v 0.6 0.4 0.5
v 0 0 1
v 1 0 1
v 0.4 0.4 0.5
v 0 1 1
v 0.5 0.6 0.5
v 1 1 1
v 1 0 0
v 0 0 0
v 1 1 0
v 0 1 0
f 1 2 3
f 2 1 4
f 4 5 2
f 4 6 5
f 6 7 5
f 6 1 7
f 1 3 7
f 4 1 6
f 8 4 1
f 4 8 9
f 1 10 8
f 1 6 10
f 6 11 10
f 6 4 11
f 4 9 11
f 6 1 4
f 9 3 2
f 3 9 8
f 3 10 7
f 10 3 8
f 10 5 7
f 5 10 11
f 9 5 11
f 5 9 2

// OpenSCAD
polyhedron(
  points=[
    [0, 0, 0],
    [1, 0, 0],
    [0, 1, 0],
    [1, 1, 0],

    [0, 0, 1],
    [1, 0, 1],
    [0, 1, 1],
    [1, 1, 1],

    [0.4, 0.4, 0.5],
    [0.6, 0.4, 0.5],
    [0.5, 0.6, 0.5],
  ],
  faces=[
    [5,4,8,9],
    [4,6,8],
    [6,10,8],
    [6,7,10],
    [7,9,10],
    [7,5,9],
    [10,9,8],
    
    [0,1,9,8],
    [1,3,9],
    [3,10,9],
    [3,2,10],
    [2,8,10],
    [2,0,8],
    [8,9,10],
    
    [4,5,1,0],
    [5,7,3,1],
    [7,6,2,3],
    [6,4,0,2],
  ]);
